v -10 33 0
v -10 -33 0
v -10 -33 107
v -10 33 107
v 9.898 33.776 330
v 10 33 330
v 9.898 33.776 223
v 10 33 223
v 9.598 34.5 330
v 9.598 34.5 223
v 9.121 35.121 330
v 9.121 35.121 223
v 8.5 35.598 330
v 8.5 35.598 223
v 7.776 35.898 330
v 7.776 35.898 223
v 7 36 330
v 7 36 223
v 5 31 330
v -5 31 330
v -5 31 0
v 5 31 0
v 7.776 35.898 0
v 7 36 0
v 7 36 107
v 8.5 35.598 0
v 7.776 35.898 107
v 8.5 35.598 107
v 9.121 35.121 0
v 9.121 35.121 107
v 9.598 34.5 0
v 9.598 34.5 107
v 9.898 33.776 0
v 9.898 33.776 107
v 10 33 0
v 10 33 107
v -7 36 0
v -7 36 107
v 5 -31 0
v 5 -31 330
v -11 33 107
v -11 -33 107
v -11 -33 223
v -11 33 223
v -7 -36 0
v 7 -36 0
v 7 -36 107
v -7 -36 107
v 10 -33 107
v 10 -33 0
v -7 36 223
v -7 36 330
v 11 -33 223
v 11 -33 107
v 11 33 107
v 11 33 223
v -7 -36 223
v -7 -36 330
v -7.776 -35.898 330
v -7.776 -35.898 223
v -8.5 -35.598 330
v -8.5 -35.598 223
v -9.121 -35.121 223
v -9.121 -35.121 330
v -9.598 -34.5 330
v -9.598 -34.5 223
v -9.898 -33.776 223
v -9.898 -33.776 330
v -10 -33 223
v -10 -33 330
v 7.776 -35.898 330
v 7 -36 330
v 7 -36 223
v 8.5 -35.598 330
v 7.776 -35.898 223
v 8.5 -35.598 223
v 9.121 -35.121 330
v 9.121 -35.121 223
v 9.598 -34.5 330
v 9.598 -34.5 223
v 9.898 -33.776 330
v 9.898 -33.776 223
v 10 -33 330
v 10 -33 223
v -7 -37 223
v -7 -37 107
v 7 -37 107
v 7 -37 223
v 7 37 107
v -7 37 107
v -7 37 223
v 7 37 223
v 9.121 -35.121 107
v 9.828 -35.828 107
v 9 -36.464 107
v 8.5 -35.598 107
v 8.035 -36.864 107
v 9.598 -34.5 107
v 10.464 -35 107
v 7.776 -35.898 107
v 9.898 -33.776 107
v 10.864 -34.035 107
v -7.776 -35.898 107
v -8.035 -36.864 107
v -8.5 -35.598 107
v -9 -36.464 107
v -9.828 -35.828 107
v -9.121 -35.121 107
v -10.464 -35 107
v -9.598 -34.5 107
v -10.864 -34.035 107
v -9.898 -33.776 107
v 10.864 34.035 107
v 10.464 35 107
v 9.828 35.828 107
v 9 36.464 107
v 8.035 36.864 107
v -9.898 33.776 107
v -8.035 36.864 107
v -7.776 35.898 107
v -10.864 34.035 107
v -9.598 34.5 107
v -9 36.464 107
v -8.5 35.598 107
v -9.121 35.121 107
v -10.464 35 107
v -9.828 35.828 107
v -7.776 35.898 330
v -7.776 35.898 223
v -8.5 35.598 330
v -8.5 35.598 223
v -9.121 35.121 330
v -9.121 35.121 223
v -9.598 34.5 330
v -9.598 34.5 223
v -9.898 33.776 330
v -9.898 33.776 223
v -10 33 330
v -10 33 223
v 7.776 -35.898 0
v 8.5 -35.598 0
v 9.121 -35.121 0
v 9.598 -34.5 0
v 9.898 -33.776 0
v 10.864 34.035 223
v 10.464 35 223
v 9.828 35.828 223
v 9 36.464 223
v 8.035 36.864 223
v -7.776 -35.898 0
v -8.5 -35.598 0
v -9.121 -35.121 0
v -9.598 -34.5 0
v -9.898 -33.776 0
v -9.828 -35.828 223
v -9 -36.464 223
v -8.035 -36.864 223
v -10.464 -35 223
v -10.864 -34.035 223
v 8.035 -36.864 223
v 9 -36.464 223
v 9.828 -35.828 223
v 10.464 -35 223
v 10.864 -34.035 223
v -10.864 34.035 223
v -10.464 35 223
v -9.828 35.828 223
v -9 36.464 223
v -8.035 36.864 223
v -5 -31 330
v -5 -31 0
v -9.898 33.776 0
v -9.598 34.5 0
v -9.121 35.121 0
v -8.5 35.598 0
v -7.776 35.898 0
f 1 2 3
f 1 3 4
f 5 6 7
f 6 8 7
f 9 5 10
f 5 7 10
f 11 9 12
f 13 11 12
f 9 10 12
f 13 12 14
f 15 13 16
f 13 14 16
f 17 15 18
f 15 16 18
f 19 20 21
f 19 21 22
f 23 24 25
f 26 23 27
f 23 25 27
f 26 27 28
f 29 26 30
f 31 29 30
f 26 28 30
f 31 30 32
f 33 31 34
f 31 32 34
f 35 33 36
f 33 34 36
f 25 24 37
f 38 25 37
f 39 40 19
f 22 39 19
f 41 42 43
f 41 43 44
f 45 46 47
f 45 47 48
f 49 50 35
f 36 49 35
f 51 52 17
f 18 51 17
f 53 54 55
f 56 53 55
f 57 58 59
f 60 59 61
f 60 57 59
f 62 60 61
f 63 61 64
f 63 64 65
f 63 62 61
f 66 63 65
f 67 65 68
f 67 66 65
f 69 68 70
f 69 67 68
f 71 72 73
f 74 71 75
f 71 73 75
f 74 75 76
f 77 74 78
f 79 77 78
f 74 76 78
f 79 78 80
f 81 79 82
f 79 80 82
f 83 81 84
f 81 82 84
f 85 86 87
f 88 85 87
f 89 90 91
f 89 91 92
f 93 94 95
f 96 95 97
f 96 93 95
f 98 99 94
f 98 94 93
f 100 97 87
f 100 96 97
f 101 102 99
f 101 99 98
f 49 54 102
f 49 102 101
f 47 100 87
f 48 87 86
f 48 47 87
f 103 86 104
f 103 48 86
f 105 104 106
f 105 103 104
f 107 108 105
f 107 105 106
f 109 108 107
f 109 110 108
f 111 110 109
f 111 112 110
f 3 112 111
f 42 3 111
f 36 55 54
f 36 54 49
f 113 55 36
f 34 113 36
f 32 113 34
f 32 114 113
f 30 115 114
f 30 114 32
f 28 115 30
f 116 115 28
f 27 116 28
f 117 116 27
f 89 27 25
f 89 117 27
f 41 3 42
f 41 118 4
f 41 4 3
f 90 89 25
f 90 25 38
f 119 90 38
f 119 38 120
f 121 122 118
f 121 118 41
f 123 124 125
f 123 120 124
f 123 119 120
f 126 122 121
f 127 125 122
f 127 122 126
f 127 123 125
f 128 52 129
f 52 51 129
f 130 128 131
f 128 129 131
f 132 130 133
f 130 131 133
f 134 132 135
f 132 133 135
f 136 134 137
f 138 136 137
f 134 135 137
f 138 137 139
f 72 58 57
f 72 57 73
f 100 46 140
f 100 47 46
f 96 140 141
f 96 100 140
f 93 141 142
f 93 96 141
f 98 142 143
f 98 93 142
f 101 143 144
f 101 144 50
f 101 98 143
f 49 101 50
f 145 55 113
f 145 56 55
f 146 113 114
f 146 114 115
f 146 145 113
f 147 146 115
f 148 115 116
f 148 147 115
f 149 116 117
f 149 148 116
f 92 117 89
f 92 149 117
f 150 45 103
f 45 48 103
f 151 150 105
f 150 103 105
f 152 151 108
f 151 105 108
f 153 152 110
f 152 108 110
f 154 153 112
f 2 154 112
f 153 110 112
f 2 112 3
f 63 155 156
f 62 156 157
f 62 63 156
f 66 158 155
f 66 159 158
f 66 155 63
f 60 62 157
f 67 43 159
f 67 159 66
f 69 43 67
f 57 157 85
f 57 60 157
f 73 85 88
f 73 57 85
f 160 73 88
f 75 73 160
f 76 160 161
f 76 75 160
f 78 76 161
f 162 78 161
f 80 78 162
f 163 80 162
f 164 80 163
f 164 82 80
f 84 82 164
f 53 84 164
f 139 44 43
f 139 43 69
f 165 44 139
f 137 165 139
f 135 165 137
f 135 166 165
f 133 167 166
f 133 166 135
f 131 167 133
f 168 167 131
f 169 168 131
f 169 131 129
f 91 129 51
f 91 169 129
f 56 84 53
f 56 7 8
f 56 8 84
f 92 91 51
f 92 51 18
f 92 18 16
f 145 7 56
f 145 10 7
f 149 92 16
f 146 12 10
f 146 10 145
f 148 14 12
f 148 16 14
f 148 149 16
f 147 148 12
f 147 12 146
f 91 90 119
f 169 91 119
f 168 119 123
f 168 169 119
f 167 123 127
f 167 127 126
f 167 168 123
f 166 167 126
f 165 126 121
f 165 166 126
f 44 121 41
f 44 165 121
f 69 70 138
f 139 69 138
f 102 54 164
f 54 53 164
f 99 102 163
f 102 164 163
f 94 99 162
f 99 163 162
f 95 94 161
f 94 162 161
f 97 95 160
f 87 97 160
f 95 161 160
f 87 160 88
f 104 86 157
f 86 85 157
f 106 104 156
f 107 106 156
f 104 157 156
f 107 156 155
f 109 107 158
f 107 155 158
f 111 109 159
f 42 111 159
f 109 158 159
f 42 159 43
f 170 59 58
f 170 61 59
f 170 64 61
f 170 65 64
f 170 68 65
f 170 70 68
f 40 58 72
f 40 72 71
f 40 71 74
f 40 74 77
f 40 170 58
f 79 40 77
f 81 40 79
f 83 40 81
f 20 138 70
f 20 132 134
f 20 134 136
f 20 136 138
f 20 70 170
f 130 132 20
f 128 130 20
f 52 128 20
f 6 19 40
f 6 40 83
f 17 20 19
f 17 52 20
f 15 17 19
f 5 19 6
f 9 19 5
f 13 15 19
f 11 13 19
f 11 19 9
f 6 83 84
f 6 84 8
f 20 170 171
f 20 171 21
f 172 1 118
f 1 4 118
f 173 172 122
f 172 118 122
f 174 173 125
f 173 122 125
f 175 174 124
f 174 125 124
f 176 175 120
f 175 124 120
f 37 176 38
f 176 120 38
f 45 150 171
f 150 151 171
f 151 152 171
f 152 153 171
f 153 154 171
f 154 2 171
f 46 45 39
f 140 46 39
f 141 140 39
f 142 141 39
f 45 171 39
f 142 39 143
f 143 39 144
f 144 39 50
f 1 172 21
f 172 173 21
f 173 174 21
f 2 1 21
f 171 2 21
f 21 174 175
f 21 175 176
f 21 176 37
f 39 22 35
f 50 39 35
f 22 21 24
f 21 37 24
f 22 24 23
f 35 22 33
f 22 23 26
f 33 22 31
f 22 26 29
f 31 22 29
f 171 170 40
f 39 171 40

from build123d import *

# Parameters (mm, degrees)
SKETCH1_W               = 22
SKETCH1_H               = 74
BOSS_EXTRUDE1_DEPTH     = 330
SKETCH4_W               = 10
SKETCH4_H               = 62
CUT_EXTRUDE2_DEPTH      = 1
CUT_EXTRUDE2_DEPTH_BACK = 331
SKETCH6_W               = 22
SKETCH6_H               = 74
SKETCH6_W_2             = 20
SKETCH6_H_2             = 72
CUT_EXTRUDE4_DEPTH      = 107
SKETCH7_W               = 22
SKETCH7_H               = 74
SKETCH7_W_2             = 20
SKETCH7_H_2             = 72
CUT_EXTRUDE5_DEPTH      = 107
FILLET1_R               = 3
FILLET2_R               = 4


with BuildPart() as part:
    # Sketch1 → Boss-Extrude1 (new body)
    with BuildSketch(Plane.XY):
        Rectangle(SKETCH1_W, SKETCH1_H)
    extrude(amount=BOSS_EXTRUDE1_DEPTH)

    # Sketch4 → Cut-Extrude2 (cut, two sides)
    with BuildSketch(Plane.XY.offset(330)) as cut_extrude2_sk:
        Rectangle(SKETCH4_W, SKETCH4_H)
    extrude(amount=CUT_EXTRUDE2_DEPTH, mode=Mode.SUBTRACT)
    extrude(cut_extrude2_sk.sketch, amount=-CUT_EXTRUDE2_DEPTH_BACK, mode=Mode.SUBTRACT)

    # Sketch6 → Cut-Extrude4 (cut)
    with BuildSketch(Plane.XY.offset(330)):
        Rectangle(SKETCH6_W, SKETCH6_H)
        Rectangle(SKETCH6_W_2, SKETCH6_H_2, mode=Mode.SUBTRACT)
    extrude(amount=-CUT_EXTRUDE4_DEPTH, mode=Mode.SUBTRACT)

    # Sketch7 → Cut-Extrude5 (cut)
    with BuildSketch(Plane(origin=(0, 0, 0), x_dir=(-1, 0, 0), z_dir=(0, 0, -1))):
        Rectangle(SKETCH7_W, SKETCH7_H)
        Rectangle(SKETCH7_W_2, SKETCH7_H_2, mode=Mode.SUBTRACT)
    extrude(amount=-CUT_EXTRUDE5_DEPTH, mode=Mode.SUBTRACT)

    # Fillet1
    fillet1_edges = [part.edges().sort_by_distance(p)[0] for p in [
        (10, -36, 276.5),
        (-10, -36, 276.5),
        (-10, 36, 276.5),
        (10, 36, 276.5),
        (-10, -36, 53.5),
        (10, -36, 53.5),
        (10, 36, 53.5),
        (-10, 36, 53.5),
    ]]
    fillet(fillet1_edges, radius=FILLET1_R)

    # Fillet2
    fillet2_edges = [part.edges().sort_by_distance(p)[0] for p in [
        (11, -37, 165),
        (-11, -37, 165),
        (-11, 37, 165),
        (11, 37, 165),
    ]]
    fillet(fillet2_edges, radius=FILLET2_R)


solid = part.part
